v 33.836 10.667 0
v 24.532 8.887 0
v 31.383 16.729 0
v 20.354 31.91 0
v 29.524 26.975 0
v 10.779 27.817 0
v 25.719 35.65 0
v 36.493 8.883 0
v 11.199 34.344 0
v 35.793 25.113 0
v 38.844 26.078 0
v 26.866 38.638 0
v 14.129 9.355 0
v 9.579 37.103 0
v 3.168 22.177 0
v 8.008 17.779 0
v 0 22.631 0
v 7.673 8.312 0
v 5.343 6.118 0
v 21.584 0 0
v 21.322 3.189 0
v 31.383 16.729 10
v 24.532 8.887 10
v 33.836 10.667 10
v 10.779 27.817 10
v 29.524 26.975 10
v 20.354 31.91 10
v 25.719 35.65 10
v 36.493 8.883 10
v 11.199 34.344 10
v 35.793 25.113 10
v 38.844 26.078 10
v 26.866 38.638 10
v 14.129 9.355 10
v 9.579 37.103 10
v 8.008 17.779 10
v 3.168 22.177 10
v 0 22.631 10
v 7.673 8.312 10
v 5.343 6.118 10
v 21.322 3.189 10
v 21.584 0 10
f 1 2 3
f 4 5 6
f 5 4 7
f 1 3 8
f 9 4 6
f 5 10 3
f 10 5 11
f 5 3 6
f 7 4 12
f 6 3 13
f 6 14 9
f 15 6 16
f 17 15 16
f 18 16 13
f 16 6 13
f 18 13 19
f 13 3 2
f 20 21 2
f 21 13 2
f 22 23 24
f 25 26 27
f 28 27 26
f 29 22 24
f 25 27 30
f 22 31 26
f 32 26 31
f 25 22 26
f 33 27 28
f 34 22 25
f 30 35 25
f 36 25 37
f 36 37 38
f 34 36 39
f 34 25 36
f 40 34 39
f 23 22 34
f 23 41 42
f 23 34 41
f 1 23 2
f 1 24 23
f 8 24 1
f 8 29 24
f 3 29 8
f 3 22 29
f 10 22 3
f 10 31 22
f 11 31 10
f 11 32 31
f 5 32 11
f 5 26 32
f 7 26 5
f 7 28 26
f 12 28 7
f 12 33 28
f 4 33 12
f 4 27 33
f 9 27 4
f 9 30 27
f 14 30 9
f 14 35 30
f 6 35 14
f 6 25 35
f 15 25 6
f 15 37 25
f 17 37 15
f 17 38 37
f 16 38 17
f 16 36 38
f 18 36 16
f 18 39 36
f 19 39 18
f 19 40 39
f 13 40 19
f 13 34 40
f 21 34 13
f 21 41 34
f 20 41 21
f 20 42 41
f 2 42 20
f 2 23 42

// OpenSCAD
$fn = 32;

// ----------------------------------------------------------------------
// Fan rotor section: 7 blades, 12 mm hub radius, 8 mm blades
// ----------------------------------------------------------------------

// --- parameters (mm) ---
profile_height = 10;      // extrusion height
profile_points = 21;      // points of the closed outline

profile = [[31.383, 16.729], [35.793, 25.113], [38.844, 26.078], [29.524, 26.975], [25.719, 35.65], [26.866, 38.638], [20.354, 31.91], [11.199, 34.344], [9.579, 37.103], [10.779, 27.817], [3.168, 22.177], [0, 22.631], [8.008, 17.779], [7.673, 8.312], [5.343, 6.118], [14.129, 9.355], [21.322, 3.189], [21.584, 0], [24.532, 8.887], [33.836, 10.667], [36.493, 8.883]];  // single closed polygon, 21 points, counter clockwise

// --- the one profile operation ---
linear_extrude(height = profile_height) polygon(points = profile);
